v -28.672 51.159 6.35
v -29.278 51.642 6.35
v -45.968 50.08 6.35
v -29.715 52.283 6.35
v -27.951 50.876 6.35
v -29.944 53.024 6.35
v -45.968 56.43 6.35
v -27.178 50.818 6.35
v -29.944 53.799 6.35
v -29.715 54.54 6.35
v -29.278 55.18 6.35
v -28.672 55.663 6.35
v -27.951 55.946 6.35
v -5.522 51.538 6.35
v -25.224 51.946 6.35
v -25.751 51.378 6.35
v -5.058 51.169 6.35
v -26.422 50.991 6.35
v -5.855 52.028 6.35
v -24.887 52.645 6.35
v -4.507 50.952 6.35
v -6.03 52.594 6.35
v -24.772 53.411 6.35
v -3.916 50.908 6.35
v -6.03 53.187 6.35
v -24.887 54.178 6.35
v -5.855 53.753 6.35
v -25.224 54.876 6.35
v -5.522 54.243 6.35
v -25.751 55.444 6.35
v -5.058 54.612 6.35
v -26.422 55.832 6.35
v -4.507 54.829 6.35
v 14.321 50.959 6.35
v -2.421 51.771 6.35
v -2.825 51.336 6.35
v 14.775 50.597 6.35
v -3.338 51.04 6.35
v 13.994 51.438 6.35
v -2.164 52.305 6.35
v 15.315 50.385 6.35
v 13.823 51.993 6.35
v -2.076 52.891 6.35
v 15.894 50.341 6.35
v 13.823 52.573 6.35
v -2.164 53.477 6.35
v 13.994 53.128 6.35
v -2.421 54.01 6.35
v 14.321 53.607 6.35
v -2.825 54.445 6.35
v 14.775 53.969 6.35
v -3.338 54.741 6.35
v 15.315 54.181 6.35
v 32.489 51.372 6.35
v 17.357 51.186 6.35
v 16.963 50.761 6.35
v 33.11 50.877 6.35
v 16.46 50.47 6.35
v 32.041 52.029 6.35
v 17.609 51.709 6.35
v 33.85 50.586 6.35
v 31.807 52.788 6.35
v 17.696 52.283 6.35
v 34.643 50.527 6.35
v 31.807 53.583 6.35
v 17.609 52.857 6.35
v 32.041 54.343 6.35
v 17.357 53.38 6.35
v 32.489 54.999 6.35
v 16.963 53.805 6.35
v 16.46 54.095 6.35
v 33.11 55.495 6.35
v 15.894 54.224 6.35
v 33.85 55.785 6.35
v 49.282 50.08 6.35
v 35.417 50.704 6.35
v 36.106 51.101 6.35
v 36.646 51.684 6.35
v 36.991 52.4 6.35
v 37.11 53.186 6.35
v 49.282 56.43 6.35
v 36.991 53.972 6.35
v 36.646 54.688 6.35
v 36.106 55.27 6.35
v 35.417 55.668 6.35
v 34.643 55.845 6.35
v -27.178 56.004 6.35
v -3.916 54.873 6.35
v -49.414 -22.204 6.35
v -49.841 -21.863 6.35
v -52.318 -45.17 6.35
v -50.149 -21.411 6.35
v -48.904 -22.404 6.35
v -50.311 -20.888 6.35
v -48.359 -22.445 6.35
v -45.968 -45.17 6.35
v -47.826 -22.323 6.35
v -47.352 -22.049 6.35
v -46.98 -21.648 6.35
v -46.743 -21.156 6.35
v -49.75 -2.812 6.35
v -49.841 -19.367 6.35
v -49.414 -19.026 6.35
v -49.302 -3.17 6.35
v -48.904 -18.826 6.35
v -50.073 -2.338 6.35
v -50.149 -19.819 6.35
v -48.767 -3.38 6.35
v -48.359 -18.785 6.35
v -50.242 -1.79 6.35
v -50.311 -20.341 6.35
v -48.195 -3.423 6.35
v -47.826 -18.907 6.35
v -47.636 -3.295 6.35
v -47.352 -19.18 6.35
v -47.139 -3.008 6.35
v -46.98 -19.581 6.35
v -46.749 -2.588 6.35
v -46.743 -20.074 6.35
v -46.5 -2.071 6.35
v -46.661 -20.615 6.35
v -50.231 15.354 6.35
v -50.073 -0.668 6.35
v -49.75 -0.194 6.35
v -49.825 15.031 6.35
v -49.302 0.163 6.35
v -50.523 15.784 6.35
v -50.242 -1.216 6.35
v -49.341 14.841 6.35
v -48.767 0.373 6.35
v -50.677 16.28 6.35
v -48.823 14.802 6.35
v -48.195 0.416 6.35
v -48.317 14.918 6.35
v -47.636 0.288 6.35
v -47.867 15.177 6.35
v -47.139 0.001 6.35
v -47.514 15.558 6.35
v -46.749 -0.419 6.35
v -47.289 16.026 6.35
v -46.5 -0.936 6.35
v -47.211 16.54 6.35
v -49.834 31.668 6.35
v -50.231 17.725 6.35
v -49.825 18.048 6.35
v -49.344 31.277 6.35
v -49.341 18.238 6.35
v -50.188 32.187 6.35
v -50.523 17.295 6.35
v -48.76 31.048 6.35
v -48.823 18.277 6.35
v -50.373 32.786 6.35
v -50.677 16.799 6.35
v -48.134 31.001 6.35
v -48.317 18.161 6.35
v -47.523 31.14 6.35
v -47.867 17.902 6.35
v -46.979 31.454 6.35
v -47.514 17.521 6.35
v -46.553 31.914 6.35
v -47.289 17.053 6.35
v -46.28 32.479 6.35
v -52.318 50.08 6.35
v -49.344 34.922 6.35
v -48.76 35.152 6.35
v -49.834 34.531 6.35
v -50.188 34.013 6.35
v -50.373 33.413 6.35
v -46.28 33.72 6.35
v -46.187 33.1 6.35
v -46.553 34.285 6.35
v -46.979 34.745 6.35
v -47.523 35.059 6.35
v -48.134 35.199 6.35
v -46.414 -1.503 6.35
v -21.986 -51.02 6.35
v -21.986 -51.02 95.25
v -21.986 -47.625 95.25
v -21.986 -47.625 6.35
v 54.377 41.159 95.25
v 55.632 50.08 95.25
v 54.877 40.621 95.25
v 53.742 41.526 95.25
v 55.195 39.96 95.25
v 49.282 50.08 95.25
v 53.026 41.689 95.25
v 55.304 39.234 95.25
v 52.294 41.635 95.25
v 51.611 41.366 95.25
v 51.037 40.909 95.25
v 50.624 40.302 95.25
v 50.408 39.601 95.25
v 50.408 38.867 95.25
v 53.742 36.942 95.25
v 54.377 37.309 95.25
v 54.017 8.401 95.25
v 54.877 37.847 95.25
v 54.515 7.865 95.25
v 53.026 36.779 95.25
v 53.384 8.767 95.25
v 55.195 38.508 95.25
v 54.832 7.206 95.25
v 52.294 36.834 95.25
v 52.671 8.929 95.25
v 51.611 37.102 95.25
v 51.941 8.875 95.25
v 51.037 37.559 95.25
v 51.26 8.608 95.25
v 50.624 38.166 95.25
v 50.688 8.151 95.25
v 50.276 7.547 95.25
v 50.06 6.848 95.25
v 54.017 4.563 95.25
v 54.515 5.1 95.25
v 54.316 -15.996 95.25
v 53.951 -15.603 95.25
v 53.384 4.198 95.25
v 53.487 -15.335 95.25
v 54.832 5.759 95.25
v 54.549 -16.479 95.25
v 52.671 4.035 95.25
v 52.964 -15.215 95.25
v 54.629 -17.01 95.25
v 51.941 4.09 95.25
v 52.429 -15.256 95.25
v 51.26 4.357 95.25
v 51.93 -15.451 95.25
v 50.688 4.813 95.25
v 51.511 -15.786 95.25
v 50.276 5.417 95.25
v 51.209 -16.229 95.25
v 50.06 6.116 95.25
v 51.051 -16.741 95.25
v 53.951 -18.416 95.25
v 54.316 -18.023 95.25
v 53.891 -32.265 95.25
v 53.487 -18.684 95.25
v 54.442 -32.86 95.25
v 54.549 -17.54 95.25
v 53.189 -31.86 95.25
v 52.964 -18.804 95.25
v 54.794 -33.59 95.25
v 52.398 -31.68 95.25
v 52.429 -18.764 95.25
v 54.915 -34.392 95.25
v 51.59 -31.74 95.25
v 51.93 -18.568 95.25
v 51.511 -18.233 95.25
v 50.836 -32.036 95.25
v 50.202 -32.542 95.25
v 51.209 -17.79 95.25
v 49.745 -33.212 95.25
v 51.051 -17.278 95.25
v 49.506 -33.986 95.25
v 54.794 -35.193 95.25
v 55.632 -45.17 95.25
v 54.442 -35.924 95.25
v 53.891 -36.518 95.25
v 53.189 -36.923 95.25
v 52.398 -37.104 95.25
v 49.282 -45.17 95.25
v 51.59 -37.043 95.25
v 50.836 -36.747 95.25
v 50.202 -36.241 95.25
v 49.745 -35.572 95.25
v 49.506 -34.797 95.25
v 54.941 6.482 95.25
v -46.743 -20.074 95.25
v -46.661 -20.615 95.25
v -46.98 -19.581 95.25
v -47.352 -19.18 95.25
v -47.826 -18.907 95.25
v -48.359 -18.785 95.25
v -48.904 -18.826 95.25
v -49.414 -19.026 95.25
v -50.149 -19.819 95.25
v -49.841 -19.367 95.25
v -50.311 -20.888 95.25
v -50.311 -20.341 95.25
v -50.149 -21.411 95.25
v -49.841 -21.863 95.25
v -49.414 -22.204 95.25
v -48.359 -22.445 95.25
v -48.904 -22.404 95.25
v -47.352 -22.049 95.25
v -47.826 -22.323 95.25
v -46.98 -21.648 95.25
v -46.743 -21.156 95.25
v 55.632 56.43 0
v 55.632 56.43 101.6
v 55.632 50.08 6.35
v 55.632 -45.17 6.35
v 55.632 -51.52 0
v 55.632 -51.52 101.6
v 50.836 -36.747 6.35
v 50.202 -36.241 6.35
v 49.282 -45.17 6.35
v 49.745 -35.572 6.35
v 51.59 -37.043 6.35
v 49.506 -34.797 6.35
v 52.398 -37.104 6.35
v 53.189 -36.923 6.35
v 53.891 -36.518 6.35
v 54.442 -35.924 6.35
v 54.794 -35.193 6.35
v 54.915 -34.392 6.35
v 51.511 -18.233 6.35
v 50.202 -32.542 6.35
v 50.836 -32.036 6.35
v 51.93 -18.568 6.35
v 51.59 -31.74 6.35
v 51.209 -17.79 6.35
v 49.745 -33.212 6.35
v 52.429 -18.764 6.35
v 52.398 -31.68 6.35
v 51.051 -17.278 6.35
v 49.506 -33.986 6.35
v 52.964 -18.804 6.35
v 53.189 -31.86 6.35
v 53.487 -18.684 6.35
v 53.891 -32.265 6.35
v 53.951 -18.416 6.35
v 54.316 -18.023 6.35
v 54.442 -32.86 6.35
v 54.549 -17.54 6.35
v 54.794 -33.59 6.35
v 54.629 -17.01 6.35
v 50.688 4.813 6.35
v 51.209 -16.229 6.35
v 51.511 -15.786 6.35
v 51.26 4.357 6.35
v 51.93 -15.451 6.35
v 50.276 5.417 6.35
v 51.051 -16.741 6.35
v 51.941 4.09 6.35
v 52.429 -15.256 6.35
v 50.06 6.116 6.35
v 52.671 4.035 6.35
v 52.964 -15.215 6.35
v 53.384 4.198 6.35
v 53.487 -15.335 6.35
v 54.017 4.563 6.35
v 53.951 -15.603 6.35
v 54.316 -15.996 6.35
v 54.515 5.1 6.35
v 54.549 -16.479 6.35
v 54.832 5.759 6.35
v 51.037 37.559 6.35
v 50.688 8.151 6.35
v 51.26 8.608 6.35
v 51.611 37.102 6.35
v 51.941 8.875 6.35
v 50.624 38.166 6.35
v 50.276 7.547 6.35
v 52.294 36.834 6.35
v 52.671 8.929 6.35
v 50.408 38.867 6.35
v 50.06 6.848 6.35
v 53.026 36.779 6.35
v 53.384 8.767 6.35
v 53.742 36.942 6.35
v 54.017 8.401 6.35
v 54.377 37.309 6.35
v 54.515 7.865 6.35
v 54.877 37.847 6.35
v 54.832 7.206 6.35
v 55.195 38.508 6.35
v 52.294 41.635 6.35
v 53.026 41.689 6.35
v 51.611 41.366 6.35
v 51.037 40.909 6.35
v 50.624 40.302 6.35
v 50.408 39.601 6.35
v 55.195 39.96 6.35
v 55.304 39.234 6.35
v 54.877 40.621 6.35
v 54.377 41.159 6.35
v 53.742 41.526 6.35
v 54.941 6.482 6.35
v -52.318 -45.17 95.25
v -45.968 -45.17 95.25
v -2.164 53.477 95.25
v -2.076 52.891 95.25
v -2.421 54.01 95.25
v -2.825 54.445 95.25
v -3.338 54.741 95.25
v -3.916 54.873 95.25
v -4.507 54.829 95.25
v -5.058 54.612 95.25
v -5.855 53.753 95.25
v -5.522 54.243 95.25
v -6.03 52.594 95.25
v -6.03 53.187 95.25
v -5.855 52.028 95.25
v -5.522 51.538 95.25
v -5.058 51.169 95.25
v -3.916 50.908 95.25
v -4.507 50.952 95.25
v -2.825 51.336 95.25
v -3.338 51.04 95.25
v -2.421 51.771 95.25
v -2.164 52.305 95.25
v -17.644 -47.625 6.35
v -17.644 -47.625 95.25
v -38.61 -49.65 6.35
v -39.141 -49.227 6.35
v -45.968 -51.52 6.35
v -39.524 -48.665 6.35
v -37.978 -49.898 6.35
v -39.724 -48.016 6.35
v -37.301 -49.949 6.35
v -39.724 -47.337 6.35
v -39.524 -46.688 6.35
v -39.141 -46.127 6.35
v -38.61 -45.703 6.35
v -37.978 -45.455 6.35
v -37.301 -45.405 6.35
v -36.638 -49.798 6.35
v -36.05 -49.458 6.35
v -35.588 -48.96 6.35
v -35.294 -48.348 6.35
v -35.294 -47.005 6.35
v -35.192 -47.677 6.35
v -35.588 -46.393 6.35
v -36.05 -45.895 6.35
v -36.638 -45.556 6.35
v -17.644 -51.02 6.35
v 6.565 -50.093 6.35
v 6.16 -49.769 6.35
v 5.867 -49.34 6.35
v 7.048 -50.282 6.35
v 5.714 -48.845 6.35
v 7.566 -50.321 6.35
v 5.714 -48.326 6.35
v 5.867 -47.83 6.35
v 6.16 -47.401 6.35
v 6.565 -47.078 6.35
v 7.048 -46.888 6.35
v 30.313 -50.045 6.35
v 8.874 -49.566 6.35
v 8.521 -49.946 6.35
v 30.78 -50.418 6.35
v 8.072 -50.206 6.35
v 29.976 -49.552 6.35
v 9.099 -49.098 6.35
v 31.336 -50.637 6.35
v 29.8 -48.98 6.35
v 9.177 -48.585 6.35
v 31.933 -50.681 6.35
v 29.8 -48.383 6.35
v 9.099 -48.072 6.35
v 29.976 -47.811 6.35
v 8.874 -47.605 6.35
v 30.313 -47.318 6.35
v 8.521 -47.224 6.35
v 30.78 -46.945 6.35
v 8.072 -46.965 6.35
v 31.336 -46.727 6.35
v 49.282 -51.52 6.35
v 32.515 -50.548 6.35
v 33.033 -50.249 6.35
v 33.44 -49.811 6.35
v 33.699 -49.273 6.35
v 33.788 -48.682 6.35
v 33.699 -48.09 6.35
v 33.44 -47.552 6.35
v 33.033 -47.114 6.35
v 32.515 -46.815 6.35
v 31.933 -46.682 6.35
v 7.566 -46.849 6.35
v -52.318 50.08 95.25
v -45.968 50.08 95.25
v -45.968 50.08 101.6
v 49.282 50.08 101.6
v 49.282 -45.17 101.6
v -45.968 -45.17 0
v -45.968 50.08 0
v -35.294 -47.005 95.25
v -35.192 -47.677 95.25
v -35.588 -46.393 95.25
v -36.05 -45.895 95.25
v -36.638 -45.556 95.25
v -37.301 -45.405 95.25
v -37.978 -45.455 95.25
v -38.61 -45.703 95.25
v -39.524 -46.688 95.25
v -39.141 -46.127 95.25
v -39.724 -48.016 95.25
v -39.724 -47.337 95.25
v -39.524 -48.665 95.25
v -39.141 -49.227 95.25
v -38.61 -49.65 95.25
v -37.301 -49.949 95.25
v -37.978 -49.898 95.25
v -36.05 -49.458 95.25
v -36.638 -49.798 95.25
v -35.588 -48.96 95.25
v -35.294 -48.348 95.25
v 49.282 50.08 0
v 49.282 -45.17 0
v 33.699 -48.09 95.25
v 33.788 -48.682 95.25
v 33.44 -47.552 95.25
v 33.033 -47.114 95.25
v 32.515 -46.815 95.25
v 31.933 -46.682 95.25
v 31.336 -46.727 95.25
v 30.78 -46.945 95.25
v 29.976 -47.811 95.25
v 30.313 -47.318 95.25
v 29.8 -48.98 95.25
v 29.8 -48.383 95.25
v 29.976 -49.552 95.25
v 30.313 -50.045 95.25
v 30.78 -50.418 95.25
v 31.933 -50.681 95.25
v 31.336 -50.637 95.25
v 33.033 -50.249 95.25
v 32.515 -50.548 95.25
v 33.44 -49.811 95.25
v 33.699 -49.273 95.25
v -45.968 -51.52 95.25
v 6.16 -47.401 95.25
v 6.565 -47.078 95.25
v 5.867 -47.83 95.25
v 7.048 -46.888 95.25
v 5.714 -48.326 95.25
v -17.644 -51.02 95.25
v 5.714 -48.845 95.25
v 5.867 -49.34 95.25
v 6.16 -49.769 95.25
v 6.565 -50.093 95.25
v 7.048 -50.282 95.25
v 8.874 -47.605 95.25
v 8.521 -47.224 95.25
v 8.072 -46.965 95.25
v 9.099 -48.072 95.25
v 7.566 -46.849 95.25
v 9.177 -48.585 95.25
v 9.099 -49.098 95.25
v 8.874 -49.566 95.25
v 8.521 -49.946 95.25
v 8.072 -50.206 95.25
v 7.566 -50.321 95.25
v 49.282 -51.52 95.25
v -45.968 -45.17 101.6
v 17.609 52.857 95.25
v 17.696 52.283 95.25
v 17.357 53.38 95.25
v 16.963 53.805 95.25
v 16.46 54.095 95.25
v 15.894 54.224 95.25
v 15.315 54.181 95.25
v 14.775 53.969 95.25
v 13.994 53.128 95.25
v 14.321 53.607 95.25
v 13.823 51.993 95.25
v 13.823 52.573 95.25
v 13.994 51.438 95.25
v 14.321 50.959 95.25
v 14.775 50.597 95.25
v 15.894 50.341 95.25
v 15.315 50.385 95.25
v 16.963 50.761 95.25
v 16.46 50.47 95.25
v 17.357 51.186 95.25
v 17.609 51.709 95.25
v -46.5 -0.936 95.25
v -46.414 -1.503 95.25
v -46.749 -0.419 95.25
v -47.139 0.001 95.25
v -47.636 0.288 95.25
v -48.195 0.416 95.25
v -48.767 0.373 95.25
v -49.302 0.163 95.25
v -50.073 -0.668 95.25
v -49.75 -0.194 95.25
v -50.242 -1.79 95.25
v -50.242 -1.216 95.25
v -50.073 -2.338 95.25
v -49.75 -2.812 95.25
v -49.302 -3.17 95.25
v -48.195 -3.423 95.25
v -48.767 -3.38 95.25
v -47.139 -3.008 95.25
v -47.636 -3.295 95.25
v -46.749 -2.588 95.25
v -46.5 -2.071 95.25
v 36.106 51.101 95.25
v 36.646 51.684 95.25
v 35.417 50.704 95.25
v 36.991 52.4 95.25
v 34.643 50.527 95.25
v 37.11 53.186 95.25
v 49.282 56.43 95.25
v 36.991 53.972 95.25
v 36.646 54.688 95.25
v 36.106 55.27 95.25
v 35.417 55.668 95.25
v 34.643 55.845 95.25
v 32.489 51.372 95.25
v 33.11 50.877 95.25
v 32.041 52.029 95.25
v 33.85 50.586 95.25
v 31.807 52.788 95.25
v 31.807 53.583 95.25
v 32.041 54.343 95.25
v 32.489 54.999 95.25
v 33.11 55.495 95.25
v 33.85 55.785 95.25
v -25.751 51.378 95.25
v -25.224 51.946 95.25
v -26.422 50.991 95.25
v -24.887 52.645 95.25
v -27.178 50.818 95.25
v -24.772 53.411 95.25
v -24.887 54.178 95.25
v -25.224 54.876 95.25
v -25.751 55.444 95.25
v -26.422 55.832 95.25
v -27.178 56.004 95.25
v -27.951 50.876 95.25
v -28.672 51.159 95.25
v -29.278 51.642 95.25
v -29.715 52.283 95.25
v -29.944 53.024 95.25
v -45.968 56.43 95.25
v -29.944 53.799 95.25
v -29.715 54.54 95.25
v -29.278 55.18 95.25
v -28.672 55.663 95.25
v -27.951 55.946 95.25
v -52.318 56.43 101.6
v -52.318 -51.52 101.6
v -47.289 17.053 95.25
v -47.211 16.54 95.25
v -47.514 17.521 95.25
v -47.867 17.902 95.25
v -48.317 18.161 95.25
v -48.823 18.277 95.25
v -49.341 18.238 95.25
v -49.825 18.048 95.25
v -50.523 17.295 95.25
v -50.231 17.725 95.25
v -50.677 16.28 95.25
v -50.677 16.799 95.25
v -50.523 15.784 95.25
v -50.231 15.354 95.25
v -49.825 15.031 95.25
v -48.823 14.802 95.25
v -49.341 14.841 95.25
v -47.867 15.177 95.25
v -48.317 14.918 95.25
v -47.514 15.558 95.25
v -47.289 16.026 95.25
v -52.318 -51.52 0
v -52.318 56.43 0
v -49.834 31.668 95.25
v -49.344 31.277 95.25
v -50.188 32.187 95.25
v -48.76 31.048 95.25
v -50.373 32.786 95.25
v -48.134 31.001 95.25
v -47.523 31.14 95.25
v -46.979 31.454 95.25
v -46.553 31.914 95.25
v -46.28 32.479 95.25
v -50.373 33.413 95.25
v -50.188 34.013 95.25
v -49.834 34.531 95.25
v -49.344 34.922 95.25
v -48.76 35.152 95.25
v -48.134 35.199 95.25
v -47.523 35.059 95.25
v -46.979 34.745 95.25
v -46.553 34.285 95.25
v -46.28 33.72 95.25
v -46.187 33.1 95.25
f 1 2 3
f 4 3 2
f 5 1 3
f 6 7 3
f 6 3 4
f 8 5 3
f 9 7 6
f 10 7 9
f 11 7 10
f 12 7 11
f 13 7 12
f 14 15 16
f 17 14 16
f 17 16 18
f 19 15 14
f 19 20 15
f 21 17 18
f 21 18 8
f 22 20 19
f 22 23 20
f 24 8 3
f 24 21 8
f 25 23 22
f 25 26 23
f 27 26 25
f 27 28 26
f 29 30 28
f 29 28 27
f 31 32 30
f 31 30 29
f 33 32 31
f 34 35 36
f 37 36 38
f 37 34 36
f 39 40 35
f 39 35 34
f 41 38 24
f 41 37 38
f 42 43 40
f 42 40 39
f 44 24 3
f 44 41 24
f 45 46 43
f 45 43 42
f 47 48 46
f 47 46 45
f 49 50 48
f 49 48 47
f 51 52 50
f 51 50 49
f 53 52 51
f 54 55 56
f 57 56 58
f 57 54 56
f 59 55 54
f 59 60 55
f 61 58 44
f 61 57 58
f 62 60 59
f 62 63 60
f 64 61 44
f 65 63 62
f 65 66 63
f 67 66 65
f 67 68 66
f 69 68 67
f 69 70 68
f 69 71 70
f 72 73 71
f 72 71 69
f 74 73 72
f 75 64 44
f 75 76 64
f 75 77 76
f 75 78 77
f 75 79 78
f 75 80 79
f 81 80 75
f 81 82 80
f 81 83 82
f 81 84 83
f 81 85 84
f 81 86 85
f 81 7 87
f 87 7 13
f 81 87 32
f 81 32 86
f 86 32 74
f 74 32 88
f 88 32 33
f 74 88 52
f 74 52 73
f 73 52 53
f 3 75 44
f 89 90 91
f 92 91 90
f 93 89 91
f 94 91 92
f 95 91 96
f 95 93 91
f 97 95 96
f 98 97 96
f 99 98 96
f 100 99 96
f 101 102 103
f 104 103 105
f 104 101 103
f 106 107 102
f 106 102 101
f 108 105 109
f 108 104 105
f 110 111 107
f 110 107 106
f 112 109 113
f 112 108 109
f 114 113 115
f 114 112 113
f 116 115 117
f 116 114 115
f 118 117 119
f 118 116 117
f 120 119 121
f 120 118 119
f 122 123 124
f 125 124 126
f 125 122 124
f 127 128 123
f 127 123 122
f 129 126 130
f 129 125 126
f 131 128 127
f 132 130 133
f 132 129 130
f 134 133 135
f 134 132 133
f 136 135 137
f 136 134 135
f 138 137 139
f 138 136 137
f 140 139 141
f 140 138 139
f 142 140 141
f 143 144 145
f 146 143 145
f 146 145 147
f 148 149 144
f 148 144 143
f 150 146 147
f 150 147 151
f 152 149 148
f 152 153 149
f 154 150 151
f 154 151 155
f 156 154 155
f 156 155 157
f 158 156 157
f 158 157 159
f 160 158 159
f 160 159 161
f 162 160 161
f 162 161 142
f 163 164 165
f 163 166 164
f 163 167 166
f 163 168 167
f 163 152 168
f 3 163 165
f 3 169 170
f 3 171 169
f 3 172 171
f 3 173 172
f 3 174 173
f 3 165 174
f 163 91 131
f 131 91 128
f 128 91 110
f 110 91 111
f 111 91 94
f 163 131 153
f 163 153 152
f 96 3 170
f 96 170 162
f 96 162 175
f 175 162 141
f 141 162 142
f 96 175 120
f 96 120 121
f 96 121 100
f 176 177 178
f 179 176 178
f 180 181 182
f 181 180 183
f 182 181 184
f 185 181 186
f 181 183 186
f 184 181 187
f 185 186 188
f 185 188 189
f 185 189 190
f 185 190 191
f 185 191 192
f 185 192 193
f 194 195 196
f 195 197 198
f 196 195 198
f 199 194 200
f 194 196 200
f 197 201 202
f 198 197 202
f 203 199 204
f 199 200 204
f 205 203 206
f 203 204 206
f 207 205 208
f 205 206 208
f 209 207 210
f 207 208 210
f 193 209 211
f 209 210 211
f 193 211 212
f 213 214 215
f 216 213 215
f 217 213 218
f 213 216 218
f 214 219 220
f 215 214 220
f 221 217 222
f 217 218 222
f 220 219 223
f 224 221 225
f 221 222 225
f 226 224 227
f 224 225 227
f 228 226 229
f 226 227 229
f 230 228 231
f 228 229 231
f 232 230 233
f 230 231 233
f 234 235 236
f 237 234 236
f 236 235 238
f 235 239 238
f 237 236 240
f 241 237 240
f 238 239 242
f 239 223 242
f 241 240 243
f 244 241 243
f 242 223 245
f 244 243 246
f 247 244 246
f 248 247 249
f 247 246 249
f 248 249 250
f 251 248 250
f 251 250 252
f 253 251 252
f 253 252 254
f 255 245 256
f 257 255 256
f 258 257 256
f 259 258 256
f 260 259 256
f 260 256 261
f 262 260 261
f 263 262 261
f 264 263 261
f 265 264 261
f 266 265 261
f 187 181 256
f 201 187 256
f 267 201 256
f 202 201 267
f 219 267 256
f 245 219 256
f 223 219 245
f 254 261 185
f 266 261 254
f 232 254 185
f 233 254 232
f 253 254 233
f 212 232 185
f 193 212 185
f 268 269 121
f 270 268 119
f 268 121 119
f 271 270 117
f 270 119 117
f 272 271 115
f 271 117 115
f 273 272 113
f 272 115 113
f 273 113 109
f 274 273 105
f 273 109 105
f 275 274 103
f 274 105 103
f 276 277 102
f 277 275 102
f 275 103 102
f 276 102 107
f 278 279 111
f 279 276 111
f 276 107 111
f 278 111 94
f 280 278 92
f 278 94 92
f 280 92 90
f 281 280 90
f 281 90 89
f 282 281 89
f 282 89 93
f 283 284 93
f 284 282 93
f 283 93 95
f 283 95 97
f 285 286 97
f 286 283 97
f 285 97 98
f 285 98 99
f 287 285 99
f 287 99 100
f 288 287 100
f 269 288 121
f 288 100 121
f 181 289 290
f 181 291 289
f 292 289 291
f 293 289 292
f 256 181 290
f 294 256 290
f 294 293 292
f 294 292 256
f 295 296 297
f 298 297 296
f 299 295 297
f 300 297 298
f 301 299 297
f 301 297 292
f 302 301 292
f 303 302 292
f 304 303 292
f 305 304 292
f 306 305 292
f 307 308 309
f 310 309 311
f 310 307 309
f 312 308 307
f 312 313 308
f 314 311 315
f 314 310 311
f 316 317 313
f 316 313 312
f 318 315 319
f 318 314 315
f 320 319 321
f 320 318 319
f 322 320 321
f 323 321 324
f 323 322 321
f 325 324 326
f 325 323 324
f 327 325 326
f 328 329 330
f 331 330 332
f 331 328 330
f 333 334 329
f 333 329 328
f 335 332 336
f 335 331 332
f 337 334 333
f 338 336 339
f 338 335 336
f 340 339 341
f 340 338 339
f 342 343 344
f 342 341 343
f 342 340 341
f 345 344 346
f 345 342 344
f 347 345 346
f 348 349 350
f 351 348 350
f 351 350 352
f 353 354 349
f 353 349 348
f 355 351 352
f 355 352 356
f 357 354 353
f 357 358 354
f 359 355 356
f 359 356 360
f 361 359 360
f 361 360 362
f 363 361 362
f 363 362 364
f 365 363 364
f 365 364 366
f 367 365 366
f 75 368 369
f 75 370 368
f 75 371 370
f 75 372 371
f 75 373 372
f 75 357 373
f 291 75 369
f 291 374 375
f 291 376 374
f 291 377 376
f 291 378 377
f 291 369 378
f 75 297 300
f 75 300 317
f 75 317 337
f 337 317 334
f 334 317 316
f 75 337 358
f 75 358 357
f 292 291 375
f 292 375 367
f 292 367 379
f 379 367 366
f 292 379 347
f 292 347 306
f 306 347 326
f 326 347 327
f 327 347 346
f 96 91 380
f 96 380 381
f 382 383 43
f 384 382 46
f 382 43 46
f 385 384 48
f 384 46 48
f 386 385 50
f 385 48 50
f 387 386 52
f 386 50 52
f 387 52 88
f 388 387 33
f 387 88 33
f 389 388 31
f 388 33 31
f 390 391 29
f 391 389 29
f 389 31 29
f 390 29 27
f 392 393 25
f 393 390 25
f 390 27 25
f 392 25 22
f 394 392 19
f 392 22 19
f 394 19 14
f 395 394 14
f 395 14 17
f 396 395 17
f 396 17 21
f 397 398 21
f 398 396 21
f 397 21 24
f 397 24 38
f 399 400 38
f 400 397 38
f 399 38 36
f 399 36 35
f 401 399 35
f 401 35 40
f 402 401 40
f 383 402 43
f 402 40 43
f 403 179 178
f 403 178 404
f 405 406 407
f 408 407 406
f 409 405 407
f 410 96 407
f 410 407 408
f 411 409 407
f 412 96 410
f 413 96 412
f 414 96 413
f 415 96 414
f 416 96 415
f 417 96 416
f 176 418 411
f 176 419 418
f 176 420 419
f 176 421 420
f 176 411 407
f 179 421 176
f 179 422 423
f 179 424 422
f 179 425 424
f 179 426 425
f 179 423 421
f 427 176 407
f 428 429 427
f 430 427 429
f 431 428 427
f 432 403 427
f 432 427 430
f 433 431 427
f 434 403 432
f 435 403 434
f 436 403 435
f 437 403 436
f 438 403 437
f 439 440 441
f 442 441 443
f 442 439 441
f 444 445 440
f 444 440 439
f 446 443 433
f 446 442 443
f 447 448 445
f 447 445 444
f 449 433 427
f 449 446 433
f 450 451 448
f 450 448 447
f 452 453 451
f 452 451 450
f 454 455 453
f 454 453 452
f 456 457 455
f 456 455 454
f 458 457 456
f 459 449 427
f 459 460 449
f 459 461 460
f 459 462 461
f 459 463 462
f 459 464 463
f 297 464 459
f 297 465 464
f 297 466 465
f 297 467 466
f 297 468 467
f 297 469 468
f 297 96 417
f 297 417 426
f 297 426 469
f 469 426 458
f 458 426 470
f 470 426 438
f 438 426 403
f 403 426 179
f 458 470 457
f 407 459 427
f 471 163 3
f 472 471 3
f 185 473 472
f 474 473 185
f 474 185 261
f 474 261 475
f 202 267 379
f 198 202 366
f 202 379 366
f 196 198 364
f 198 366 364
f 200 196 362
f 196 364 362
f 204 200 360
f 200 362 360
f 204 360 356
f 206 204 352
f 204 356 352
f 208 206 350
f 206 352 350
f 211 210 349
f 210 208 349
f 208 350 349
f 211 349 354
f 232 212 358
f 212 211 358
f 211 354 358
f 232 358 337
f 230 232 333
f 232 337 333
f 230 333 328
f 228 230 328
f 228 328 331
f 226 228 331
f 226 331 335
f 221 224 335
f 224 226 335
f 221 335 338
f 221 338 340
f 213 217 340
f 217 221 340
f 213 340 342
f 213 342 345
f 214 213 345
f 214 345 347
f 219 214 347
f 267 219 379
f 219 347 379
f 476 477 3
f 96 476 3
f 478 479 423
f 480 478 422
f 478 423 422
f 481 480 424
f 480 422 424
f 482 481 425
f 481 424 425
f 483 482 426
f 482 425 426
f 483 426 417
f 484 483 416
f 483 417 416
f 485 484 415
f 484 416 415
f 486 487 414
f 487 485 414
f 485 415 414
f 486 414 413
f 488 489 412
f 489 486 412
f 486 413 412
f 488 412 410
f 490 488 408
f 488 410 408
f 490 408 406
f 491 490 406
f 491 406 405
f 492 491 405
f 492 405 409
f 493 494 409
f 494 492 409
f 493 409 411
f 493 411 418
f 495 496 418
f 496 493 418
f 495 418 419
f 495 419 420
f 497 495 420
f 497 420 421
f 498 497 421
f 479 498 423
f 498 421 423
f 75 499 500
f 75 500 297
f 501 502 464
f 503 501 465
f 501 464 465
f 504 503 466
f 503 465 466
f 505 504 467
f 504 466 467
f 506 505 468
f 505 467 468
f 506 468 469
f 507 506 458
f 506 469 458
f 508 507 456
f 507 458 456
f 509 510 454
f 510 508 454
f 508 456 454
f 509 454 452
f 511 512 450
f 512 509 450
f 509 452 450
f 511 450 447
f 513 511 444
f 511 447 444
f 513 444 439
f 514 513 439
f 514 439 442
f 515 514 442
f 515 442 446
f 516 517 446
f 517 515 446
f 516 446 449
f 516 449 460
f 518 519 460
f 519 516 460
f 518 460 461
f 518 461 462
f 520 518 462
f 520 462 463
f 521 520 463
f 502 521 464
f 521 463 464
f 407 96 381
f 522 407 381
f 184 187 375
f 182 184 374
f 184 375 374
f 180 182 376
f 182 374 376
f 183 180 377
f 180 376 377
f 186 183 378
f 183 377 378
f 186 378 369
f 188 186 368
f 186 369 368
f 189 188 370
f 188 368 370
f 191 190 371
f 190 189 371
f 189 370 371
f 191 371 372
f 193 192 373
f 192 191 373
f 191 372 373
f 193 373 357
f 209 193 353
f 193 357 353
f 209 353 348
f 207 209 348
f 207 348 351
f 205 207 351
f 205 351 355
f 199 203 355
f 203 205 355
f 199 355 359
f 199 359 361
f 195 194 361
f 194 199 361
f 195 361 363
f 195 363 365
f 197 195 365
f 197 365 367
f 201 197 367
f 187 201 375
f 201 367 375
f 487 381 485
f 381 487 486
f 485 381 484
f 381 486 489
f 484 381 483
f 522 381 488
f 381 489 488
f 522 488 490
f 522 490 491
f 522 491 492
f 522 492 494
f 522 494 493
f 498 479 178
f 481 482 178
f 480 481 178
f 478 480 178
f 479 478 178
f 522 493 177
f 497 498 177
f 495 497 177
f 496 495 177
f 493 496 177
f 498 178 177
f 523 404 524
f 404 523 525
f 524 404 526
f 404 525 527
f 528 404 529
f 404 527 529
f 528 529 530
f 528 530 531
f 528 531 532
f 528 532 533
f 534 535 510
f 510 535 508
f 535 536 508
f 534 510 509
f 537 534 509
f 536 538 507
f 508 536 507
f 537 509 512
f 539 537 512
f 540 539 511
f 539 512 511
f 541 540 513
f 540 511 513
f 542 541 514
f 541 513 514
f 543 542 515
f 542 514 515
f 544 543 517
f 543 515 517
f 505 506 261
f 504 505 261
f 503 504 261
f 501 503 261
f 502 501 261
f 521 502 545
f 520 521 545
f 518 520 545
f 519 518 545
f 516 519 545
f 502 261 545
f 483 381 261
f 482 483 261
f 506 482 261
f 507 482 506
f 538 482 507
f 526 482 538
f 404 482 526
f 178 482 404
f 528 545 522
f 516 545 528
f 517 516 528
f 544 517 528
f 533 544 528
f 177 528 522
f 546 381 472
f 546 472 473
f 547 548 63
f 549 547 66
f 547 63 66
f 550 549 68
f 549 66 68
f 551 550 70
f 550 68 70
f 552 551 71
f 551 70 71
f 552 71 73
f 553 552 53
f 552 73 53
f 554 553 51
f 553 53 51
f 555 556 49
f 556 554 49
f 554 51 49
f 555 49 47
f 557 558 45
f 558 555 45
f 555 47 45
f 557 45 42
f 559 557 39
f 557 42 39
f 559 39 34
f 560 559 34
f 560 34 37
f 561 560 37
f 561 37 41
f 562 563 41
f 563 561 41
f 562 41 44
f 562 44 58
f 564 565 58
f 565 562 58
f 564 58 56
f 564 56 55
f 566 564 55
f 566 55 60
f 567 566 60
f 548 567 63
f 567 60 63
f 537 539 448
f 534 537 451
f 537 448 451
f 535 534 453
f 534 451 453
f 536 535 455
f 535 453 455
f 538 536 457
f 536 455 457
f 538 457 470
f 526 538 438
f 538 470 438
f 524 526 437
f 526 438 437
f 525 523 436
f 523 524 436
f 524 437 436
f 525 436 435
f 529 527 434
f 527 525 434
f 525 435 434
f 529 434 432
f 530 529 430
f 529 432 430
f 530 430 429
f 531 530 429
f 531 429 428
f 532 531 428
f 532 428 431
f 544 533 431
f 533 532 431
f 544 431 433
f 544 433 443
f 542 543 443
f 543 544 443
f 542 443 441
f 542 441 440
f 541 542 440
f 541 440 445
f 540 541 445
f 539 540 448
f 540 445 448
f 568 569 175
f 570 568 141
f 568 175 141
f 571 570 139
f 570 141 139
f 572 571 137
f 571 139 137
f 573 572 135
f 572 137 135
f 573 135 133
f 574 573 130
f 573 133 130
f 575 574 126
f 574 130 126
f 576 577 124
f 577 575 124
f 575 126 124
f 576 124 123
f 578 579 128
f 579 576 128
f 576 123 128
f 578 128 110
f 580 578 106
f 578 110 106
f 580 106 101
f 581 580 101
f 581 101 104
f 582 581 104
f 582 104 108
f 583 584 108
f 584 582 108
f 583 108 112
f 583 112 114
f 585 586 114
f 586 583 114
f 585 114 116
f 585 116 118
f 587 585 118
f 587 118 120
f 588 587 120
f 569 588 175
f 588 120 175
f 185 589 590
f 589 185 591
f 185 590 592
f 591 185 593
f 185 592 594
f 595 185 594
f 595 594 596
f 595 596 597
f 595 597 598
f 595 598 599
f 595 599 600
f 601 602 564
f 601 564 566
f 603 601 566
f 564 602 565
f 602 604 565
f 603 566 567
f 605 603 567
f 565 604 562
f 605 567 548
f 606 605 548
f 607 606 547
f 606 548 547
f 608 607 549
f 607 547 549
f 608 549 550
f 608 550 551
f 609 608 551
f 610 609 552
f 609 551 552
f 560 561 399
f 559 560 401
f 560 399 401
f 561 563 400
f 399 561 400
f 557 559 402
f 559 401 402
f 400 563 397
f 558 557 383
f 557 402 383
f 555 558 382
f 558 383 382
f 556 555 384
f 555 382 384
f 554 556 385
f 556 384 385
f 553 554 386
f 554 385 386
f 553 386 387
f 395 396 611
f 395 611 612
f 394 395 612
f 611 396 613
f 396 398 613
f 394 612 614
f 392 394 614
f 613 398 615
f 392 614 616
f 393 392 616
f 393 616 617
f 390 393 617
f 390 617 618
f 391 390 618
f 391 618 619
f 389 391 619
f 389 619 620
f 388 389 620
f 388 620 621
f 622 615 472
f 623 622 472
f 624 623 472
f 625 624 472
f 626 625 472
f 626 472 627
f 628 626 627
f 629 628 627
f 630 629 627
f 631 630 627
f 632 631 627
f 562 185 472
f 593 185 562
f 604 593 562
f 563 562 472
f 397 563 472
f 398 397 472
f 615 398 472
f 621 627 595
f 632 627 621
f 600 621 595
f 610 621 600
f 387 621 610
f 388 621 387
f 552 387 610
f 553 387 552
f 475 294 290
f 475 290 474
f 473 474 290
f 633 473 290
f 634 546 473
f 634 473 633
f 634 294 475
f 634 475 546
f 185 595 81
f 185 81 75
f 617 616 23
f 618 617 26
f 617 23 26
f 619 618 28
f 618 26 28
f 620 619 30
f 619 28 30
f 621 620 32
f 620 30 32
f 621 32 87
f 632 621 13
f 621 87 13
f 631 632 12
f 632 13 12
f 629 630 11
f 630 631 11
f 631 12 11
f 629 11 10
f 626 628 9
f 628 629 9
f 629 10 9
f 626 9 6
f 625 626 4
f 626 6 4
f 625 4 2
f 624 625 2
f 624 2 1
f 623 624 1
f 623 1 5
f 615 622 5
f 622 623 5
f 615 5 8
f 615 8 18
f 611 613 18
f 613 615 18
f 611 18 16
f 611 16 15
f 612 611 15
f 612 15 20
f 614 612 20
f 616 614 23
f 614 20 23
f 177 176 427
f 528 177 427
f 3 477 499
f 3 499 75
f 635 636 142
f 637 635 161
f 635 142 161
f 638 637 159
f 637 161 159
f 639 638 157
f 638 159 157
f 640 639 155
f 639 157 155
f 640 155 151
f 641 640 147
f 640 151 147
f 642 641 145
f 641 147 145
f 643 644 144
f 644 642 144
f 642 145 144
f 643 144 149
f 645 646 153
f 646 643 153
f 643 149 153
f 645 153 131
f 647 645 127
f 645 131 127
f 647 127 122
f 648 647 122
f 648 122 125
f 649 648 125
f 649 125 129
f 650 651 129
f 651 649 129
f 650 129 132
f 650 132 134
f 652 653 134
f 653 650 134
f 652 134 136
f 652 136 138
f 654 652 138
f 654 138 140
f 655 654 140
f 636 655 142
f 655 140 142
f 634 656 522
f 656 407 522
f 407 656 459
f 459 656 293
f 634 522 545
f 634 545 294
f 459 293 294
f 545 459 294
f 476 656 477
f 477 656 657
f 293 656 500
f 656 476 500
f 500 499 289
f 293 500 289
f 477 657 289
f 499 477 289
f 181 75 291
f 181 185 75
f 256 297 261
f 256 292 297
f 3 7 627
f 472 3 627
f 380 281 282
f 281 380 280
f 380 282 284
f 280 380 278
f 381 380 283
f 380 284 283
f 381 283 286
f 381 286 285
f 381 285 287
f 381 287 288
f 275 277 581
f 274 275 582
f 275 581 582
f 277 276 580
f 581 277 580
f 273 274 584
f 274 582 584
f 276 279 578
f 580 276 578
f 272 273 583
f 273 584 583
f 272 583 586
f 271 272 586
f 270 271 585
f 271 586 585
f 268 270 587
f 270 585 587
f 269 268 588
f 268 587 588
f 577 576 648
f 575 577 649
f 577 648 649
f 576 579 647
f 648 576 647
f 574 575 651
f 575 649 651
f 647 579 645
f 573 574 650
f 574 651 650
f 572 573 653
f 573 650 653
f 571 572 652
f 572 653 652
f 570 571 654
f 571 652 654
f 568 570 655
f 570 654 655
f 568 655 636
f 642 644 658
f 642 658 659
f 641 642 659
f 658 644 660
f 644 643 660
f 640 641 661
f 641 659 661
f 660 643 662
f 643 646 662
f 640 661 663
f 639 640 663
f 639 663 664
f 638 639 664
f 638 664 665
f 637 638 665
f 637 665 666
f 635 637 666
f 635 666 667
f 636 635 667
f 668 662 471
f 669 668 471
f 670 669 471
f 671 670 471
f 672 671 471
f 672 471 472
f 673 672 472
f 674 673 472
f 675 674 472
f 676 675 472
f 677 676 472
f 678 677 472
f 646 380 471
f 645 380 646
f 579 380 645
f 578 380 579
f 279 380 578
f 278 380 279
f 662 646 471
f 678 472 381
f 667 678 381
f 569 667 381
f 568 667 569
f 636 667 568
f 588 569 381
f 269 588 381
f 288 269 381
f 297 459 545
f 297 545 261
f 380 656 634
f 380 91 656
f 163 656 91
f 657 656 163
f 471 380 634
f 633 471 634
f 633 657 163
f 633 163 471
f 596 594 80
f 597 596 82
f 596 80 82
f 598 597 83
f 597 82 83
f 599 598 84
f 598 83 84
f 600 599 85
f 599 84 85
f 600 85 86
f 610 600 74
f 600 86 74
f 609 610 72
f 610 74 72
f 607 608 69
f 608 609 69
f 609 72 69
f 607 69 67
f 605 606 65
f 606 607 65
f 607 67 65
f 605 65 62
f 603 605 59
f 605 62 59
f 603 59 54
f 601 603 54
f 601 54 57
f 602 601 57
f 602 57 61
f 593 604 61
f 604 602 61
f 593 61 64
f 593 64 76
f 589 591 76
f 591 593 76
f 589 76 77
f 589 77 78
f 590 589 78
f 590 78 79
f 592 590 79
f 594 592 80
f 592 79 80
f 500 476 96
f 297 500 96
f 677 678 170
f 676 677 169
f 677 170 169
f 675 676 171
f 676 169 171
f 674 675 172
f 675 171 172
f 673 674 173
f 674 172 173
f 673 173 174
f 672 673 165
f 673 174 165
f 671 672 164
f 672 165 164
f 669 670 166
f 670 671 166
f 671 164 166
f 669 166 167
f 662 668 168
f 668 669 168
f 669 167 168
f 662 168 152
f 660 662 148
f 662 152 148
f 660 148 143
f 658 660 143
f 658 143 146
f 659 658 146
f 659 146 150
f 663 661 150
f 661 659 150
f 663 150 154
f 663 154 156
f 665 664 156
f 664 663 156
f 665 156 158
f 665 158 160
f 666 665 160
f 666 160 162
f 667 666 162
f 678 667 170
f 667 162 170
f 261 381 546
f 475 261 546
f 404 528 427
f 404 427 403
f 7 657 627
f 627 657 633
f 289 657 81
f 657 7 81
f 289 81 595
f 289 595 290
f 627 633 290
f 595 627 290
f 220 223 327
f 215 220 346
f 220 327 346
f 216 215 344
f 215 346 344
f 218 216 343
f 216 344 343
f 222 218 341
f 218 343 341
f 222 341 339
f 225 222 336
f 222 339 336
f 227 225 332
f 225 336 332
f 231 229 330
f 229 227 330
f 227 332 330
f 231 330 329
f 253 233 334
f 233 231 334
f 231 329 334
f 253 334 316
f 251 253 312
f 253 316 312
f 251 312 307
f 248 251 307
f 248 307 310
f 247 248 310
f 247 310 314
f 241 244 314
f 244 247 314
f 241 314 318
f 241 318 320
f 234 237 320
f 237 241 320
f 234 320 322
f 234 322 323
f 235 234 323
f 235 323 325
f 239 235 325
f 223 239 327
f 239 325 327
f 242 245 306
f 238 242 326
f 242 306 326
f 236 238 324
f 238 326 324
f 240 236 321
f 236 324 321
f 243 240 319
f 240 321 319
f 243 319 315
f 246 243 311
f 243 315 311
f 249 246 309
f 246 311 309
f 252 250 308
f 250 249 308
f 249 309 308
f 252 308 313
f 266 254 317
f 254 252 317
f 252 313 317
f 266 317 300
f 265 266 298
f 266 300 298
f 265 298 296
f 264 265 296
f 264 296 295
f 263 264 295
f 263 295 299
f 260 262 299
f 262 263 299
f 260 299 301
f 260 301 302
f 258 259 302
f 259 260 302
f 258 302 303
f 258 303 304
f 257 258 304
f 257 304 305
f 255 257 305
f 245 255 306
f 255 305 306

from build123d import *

# Parameters (mm, degrees)
F0_W      = 6.35
F0_H      = 6.35
F1_DEPTH  = 101.6
F2_W      = 6.35
F2_H      = 6.35
F3_DEPTH  = 101.6
F4_W      = 6.35
F4_H      = 6.35
F5_DEPTH  = 95.25
F6_W      = 6.35
F6_H      = 6.35
F7_DEPTH  = 99.822
F8_W      = 6.35
F8_H      = 6.35
F9_DEPTH  = 101.6
F10_W     = 6.35
F10_H     = 6.35
F11_DEPTH = 101.6
F12_W     = 6.35
F12_H     = 6.35
F13_DEPTH = 97.536
F14_W     = 6.35
F14_H     = 6.35
F15_DEPTH = 95.25
F16_W     = 6.35
F16_H     = 6.35
F17_DEPTH = 96.52
F18_W     = 6.35
F18_H     = 6.35
F19_DEPTH = 101.6
F20_W     = 6.35
F20_H     = 6.35
F21_DEPTH = 92.202
F22_W     = 6.35
F22_H     = 6.35
F23_DEPTH = 97.282
F25_R     = 2.462176
F28_DEPTH = 89.916
F26_R     = 2.454167
F29_DEPTH = 91.186
F30_R     = 2.719492
F31_DEPTH = 91.186
F27_R     = 1.799115
F32_DEPTH = 92.456
F36_R     = 2.278566
F35_W     = 4.342094
F35_H     = 3.394946
F33_R     = 2.005298
F34_R     = 1.740829
F37_DEPTH = 95.25
F24_R     = 2.104729
F38_R     = 1.742329
F39_R     = 1.924697
F39_R_2   = 1.834859
F40_DEPTH = 95.25
F41_R     = 2.666191
F42_R     = 1.946965
F43_R     = 2.600414
F43_R_2   = 1.988129
F44_DEPTH = 95.25


with BuildPart() as f1:
    # F0 (on Top) → F1 (new body)
    with BuildSketch(Plane.XY):
        with Locations((-49.143255, 53.25494)):
            Rectangle(F0_W, F0_H)
    extrude(amount=F1_DEPTH)

    # F2 (on face) → F3 (join)
    with BuildSketch(Plane.XZ.offset(-50.07994)):
        with Locations((-49.143255, 3.175)):
            Rectangle(F2_W, F2_H)
    extrude(amount=F3_DEPTH)

    # F4 (on face) → F5 (join)
    with BuildSketch(Plane.XY.offset(6.35)):
        with Locations((-49.143255, -48.34506)):
            Rectangle(F4_W, F4_H)
    extrude(amount=F5_DEPTH)

    # F6 (on face) → F7 (join)
    with BuildSketch(Plane.XZ.offset(-50.07994)):
        with Locations((-49.143255, 98.425)):
            Rectangle(F6_W, F6_H)
    extrude(amount=F7_DEPTH)

    # F8 (on face) → F9 (join)
    with BuildSketch(Plane.YZ.offset(-45.968255)):
        with Locations((53.25494, 3.175)):
            Rectangle(F8_W, F8_H)
    extrude(amount=F9_DEPTH)

    # F10 (on face) → F11 (join)
    with BuildSketch(Plane.YZ.offset(-45.968255)):
        with Locations((-48.34506, 3.175)):
            Rectangle(F10_W, F10_H)
    extrude(amount=F11_DEPTH)

    # F12 (on face) → F13 (join)
    with BuildSketch(Plane.XZ.offset(-50.07994)):
        with Locations((52.456745, 3.175)):
            Rectangle(F12_W, F12_H)
    extrude(amount=F13_DEPTH)

    # F14 (on face) → F15 (join)
    with BuildSketch(Plane.XY.offset(6.35)):
        with Locations((52.456745, -48.34506)):
            Rectangle(F14_W, F14_H)
    extrude(amount=F15_DEPTH)

    # F16 (on face) → F17 (join)
    with BuildSketch(Plane(origin=(49.281745, 0, 0), x_dir=(0, -1, 0), z_dir=(-1, 0, 0))):
        with Locations((48.34506, 98.425)):
            Rectangle(F16_W, F16_H)
    extrude(amount=F17_DEPTH)

    # F18 (on face) → F19 (join)
    with BuildSketch(Plane.YZ.offset(-45.968255)):
        with Locations((53.25494, 98.425)):
            Rectangle(F18_W, F18_H)
    extrude(amount=F19_DEPTH)

    # F20 (on face) → F21 (join)
    with BuildSketch(Plane(origin=(0, 0, 95.25), x_dir=(1, 0, 0), z_dir=(0, 0, -1))):
        with Locations((52.456745, -53.25494)):
            Rectangle(F20_W, F20_H)
    extrude(amount=F21_DEPTH)

    # F22 (on face) → F23 (join)
    with BuildSketch(Plane(origin=(0, -45.17006, 0), x_dir=(-1, 0, 0), z_dir=(0, 1, 0))):
        with Locations((-52.456745, 98.425)):
            Rectangle(F22_W, F22_H)
    extrude(amount=F23_DEPTH)

    # F25 (on face) → F28 (join)
    with BuildSketch(Plane.XY.offset(6.35)):
        with Locations((52.8422, 39.234169)):
            Circle(F25_R)
    extrude(amount=F28_DEPTH)

    # F26 (on face) → F29 (join)
    with BuildSketch(Plane.XY.offset(6.35)):
        with Locations((52.487113, 6.482171)):
            Circle(F26_R)
    extrude(amount=F29_DEPTH)

    # F30 (on face) → F31 (join)
    with BuildSketch(Plane.XY.offset(6.35)):
        with Locations((52.195251, -34.391616)):
            Circle(F30_R)
    extrude(amount=F31_DEPTH)

    # F27 (on face) → F32 (join)
    with BuildSketch(Plane.XY.offset(6.35)):
        with Locations((52.82953, -17.009571)):
            Circle(F27_R)
    extrude(amount=F32_DEPTH)

    # F36 (on face) + F35 (on face) + F33 (on face) + F34 (on face) → F37 (join)
    with BuildSketch(Plane.XY.offset(6.35)):
        with Locations((-37.470926, -47.676794)):
            Circle(F36_R)
    with BuildSketch(Plane.XY.offset(6.35)):
        with Locations((-19.814698, -49.322378)):
            Rectangle(F35_W, F35_H)
    with BuildSketch(Plane.XY.offset(6.35)):
        with Locations((31.782679, -48.681542)):
            Circle(F33_R)
    with BuildSketch(Plane.XY.offset(6.35)):
        with Locations((7.43586, -48.585169)):
            Circle(F34_R)
    extrude(amount=F37_DEPTH)

    # F24 (on face) + F38 (on face) + F39 (on face) → F40 (join)
    with BuildSketch(Plane.XY.offset(6.35)):
        with Locations((-48.291616, 33.099722)):
            Circle(F24_R)
    with BuildSketch(Plane.XY.offset(6.35)):
        with Locations((-48.953682, 16.539522)):
            Circle(F38_R)
    with BuildSketch(Plane.XY.offset(6.35)):
        with Locations((-48.339192, -1.503361)):
            Circle(F39_R)
        with Locations((-48.496198, -20.61478)):
            Circle(F39_R_2)
    extrude(amount=F40_DEPTH)

    # F41 (on face) + F42 (on face) + F43 (on face) → F44 (join)
    with BuildSketch(Plane.XY.offset(6.35)):
        with Locations((34.443427, 53.185832)):
            Circle(F41_R)
    with BuildSketch(Plane.XY.offset(6.35)):
        with Locations((15.748598, 52.282806)):
            Circle(F42_R)
    with BuildSketch(Plane.XY.offset(6.35)):
        with Locations((-27.372204, 53.411223)):
            Circle(F43_R)
        with Locations((-4.064131, 52.890539)):
            Circle(F43_R_2)
    extrude(amount=F44_DEPTH)


solid = f1.part
